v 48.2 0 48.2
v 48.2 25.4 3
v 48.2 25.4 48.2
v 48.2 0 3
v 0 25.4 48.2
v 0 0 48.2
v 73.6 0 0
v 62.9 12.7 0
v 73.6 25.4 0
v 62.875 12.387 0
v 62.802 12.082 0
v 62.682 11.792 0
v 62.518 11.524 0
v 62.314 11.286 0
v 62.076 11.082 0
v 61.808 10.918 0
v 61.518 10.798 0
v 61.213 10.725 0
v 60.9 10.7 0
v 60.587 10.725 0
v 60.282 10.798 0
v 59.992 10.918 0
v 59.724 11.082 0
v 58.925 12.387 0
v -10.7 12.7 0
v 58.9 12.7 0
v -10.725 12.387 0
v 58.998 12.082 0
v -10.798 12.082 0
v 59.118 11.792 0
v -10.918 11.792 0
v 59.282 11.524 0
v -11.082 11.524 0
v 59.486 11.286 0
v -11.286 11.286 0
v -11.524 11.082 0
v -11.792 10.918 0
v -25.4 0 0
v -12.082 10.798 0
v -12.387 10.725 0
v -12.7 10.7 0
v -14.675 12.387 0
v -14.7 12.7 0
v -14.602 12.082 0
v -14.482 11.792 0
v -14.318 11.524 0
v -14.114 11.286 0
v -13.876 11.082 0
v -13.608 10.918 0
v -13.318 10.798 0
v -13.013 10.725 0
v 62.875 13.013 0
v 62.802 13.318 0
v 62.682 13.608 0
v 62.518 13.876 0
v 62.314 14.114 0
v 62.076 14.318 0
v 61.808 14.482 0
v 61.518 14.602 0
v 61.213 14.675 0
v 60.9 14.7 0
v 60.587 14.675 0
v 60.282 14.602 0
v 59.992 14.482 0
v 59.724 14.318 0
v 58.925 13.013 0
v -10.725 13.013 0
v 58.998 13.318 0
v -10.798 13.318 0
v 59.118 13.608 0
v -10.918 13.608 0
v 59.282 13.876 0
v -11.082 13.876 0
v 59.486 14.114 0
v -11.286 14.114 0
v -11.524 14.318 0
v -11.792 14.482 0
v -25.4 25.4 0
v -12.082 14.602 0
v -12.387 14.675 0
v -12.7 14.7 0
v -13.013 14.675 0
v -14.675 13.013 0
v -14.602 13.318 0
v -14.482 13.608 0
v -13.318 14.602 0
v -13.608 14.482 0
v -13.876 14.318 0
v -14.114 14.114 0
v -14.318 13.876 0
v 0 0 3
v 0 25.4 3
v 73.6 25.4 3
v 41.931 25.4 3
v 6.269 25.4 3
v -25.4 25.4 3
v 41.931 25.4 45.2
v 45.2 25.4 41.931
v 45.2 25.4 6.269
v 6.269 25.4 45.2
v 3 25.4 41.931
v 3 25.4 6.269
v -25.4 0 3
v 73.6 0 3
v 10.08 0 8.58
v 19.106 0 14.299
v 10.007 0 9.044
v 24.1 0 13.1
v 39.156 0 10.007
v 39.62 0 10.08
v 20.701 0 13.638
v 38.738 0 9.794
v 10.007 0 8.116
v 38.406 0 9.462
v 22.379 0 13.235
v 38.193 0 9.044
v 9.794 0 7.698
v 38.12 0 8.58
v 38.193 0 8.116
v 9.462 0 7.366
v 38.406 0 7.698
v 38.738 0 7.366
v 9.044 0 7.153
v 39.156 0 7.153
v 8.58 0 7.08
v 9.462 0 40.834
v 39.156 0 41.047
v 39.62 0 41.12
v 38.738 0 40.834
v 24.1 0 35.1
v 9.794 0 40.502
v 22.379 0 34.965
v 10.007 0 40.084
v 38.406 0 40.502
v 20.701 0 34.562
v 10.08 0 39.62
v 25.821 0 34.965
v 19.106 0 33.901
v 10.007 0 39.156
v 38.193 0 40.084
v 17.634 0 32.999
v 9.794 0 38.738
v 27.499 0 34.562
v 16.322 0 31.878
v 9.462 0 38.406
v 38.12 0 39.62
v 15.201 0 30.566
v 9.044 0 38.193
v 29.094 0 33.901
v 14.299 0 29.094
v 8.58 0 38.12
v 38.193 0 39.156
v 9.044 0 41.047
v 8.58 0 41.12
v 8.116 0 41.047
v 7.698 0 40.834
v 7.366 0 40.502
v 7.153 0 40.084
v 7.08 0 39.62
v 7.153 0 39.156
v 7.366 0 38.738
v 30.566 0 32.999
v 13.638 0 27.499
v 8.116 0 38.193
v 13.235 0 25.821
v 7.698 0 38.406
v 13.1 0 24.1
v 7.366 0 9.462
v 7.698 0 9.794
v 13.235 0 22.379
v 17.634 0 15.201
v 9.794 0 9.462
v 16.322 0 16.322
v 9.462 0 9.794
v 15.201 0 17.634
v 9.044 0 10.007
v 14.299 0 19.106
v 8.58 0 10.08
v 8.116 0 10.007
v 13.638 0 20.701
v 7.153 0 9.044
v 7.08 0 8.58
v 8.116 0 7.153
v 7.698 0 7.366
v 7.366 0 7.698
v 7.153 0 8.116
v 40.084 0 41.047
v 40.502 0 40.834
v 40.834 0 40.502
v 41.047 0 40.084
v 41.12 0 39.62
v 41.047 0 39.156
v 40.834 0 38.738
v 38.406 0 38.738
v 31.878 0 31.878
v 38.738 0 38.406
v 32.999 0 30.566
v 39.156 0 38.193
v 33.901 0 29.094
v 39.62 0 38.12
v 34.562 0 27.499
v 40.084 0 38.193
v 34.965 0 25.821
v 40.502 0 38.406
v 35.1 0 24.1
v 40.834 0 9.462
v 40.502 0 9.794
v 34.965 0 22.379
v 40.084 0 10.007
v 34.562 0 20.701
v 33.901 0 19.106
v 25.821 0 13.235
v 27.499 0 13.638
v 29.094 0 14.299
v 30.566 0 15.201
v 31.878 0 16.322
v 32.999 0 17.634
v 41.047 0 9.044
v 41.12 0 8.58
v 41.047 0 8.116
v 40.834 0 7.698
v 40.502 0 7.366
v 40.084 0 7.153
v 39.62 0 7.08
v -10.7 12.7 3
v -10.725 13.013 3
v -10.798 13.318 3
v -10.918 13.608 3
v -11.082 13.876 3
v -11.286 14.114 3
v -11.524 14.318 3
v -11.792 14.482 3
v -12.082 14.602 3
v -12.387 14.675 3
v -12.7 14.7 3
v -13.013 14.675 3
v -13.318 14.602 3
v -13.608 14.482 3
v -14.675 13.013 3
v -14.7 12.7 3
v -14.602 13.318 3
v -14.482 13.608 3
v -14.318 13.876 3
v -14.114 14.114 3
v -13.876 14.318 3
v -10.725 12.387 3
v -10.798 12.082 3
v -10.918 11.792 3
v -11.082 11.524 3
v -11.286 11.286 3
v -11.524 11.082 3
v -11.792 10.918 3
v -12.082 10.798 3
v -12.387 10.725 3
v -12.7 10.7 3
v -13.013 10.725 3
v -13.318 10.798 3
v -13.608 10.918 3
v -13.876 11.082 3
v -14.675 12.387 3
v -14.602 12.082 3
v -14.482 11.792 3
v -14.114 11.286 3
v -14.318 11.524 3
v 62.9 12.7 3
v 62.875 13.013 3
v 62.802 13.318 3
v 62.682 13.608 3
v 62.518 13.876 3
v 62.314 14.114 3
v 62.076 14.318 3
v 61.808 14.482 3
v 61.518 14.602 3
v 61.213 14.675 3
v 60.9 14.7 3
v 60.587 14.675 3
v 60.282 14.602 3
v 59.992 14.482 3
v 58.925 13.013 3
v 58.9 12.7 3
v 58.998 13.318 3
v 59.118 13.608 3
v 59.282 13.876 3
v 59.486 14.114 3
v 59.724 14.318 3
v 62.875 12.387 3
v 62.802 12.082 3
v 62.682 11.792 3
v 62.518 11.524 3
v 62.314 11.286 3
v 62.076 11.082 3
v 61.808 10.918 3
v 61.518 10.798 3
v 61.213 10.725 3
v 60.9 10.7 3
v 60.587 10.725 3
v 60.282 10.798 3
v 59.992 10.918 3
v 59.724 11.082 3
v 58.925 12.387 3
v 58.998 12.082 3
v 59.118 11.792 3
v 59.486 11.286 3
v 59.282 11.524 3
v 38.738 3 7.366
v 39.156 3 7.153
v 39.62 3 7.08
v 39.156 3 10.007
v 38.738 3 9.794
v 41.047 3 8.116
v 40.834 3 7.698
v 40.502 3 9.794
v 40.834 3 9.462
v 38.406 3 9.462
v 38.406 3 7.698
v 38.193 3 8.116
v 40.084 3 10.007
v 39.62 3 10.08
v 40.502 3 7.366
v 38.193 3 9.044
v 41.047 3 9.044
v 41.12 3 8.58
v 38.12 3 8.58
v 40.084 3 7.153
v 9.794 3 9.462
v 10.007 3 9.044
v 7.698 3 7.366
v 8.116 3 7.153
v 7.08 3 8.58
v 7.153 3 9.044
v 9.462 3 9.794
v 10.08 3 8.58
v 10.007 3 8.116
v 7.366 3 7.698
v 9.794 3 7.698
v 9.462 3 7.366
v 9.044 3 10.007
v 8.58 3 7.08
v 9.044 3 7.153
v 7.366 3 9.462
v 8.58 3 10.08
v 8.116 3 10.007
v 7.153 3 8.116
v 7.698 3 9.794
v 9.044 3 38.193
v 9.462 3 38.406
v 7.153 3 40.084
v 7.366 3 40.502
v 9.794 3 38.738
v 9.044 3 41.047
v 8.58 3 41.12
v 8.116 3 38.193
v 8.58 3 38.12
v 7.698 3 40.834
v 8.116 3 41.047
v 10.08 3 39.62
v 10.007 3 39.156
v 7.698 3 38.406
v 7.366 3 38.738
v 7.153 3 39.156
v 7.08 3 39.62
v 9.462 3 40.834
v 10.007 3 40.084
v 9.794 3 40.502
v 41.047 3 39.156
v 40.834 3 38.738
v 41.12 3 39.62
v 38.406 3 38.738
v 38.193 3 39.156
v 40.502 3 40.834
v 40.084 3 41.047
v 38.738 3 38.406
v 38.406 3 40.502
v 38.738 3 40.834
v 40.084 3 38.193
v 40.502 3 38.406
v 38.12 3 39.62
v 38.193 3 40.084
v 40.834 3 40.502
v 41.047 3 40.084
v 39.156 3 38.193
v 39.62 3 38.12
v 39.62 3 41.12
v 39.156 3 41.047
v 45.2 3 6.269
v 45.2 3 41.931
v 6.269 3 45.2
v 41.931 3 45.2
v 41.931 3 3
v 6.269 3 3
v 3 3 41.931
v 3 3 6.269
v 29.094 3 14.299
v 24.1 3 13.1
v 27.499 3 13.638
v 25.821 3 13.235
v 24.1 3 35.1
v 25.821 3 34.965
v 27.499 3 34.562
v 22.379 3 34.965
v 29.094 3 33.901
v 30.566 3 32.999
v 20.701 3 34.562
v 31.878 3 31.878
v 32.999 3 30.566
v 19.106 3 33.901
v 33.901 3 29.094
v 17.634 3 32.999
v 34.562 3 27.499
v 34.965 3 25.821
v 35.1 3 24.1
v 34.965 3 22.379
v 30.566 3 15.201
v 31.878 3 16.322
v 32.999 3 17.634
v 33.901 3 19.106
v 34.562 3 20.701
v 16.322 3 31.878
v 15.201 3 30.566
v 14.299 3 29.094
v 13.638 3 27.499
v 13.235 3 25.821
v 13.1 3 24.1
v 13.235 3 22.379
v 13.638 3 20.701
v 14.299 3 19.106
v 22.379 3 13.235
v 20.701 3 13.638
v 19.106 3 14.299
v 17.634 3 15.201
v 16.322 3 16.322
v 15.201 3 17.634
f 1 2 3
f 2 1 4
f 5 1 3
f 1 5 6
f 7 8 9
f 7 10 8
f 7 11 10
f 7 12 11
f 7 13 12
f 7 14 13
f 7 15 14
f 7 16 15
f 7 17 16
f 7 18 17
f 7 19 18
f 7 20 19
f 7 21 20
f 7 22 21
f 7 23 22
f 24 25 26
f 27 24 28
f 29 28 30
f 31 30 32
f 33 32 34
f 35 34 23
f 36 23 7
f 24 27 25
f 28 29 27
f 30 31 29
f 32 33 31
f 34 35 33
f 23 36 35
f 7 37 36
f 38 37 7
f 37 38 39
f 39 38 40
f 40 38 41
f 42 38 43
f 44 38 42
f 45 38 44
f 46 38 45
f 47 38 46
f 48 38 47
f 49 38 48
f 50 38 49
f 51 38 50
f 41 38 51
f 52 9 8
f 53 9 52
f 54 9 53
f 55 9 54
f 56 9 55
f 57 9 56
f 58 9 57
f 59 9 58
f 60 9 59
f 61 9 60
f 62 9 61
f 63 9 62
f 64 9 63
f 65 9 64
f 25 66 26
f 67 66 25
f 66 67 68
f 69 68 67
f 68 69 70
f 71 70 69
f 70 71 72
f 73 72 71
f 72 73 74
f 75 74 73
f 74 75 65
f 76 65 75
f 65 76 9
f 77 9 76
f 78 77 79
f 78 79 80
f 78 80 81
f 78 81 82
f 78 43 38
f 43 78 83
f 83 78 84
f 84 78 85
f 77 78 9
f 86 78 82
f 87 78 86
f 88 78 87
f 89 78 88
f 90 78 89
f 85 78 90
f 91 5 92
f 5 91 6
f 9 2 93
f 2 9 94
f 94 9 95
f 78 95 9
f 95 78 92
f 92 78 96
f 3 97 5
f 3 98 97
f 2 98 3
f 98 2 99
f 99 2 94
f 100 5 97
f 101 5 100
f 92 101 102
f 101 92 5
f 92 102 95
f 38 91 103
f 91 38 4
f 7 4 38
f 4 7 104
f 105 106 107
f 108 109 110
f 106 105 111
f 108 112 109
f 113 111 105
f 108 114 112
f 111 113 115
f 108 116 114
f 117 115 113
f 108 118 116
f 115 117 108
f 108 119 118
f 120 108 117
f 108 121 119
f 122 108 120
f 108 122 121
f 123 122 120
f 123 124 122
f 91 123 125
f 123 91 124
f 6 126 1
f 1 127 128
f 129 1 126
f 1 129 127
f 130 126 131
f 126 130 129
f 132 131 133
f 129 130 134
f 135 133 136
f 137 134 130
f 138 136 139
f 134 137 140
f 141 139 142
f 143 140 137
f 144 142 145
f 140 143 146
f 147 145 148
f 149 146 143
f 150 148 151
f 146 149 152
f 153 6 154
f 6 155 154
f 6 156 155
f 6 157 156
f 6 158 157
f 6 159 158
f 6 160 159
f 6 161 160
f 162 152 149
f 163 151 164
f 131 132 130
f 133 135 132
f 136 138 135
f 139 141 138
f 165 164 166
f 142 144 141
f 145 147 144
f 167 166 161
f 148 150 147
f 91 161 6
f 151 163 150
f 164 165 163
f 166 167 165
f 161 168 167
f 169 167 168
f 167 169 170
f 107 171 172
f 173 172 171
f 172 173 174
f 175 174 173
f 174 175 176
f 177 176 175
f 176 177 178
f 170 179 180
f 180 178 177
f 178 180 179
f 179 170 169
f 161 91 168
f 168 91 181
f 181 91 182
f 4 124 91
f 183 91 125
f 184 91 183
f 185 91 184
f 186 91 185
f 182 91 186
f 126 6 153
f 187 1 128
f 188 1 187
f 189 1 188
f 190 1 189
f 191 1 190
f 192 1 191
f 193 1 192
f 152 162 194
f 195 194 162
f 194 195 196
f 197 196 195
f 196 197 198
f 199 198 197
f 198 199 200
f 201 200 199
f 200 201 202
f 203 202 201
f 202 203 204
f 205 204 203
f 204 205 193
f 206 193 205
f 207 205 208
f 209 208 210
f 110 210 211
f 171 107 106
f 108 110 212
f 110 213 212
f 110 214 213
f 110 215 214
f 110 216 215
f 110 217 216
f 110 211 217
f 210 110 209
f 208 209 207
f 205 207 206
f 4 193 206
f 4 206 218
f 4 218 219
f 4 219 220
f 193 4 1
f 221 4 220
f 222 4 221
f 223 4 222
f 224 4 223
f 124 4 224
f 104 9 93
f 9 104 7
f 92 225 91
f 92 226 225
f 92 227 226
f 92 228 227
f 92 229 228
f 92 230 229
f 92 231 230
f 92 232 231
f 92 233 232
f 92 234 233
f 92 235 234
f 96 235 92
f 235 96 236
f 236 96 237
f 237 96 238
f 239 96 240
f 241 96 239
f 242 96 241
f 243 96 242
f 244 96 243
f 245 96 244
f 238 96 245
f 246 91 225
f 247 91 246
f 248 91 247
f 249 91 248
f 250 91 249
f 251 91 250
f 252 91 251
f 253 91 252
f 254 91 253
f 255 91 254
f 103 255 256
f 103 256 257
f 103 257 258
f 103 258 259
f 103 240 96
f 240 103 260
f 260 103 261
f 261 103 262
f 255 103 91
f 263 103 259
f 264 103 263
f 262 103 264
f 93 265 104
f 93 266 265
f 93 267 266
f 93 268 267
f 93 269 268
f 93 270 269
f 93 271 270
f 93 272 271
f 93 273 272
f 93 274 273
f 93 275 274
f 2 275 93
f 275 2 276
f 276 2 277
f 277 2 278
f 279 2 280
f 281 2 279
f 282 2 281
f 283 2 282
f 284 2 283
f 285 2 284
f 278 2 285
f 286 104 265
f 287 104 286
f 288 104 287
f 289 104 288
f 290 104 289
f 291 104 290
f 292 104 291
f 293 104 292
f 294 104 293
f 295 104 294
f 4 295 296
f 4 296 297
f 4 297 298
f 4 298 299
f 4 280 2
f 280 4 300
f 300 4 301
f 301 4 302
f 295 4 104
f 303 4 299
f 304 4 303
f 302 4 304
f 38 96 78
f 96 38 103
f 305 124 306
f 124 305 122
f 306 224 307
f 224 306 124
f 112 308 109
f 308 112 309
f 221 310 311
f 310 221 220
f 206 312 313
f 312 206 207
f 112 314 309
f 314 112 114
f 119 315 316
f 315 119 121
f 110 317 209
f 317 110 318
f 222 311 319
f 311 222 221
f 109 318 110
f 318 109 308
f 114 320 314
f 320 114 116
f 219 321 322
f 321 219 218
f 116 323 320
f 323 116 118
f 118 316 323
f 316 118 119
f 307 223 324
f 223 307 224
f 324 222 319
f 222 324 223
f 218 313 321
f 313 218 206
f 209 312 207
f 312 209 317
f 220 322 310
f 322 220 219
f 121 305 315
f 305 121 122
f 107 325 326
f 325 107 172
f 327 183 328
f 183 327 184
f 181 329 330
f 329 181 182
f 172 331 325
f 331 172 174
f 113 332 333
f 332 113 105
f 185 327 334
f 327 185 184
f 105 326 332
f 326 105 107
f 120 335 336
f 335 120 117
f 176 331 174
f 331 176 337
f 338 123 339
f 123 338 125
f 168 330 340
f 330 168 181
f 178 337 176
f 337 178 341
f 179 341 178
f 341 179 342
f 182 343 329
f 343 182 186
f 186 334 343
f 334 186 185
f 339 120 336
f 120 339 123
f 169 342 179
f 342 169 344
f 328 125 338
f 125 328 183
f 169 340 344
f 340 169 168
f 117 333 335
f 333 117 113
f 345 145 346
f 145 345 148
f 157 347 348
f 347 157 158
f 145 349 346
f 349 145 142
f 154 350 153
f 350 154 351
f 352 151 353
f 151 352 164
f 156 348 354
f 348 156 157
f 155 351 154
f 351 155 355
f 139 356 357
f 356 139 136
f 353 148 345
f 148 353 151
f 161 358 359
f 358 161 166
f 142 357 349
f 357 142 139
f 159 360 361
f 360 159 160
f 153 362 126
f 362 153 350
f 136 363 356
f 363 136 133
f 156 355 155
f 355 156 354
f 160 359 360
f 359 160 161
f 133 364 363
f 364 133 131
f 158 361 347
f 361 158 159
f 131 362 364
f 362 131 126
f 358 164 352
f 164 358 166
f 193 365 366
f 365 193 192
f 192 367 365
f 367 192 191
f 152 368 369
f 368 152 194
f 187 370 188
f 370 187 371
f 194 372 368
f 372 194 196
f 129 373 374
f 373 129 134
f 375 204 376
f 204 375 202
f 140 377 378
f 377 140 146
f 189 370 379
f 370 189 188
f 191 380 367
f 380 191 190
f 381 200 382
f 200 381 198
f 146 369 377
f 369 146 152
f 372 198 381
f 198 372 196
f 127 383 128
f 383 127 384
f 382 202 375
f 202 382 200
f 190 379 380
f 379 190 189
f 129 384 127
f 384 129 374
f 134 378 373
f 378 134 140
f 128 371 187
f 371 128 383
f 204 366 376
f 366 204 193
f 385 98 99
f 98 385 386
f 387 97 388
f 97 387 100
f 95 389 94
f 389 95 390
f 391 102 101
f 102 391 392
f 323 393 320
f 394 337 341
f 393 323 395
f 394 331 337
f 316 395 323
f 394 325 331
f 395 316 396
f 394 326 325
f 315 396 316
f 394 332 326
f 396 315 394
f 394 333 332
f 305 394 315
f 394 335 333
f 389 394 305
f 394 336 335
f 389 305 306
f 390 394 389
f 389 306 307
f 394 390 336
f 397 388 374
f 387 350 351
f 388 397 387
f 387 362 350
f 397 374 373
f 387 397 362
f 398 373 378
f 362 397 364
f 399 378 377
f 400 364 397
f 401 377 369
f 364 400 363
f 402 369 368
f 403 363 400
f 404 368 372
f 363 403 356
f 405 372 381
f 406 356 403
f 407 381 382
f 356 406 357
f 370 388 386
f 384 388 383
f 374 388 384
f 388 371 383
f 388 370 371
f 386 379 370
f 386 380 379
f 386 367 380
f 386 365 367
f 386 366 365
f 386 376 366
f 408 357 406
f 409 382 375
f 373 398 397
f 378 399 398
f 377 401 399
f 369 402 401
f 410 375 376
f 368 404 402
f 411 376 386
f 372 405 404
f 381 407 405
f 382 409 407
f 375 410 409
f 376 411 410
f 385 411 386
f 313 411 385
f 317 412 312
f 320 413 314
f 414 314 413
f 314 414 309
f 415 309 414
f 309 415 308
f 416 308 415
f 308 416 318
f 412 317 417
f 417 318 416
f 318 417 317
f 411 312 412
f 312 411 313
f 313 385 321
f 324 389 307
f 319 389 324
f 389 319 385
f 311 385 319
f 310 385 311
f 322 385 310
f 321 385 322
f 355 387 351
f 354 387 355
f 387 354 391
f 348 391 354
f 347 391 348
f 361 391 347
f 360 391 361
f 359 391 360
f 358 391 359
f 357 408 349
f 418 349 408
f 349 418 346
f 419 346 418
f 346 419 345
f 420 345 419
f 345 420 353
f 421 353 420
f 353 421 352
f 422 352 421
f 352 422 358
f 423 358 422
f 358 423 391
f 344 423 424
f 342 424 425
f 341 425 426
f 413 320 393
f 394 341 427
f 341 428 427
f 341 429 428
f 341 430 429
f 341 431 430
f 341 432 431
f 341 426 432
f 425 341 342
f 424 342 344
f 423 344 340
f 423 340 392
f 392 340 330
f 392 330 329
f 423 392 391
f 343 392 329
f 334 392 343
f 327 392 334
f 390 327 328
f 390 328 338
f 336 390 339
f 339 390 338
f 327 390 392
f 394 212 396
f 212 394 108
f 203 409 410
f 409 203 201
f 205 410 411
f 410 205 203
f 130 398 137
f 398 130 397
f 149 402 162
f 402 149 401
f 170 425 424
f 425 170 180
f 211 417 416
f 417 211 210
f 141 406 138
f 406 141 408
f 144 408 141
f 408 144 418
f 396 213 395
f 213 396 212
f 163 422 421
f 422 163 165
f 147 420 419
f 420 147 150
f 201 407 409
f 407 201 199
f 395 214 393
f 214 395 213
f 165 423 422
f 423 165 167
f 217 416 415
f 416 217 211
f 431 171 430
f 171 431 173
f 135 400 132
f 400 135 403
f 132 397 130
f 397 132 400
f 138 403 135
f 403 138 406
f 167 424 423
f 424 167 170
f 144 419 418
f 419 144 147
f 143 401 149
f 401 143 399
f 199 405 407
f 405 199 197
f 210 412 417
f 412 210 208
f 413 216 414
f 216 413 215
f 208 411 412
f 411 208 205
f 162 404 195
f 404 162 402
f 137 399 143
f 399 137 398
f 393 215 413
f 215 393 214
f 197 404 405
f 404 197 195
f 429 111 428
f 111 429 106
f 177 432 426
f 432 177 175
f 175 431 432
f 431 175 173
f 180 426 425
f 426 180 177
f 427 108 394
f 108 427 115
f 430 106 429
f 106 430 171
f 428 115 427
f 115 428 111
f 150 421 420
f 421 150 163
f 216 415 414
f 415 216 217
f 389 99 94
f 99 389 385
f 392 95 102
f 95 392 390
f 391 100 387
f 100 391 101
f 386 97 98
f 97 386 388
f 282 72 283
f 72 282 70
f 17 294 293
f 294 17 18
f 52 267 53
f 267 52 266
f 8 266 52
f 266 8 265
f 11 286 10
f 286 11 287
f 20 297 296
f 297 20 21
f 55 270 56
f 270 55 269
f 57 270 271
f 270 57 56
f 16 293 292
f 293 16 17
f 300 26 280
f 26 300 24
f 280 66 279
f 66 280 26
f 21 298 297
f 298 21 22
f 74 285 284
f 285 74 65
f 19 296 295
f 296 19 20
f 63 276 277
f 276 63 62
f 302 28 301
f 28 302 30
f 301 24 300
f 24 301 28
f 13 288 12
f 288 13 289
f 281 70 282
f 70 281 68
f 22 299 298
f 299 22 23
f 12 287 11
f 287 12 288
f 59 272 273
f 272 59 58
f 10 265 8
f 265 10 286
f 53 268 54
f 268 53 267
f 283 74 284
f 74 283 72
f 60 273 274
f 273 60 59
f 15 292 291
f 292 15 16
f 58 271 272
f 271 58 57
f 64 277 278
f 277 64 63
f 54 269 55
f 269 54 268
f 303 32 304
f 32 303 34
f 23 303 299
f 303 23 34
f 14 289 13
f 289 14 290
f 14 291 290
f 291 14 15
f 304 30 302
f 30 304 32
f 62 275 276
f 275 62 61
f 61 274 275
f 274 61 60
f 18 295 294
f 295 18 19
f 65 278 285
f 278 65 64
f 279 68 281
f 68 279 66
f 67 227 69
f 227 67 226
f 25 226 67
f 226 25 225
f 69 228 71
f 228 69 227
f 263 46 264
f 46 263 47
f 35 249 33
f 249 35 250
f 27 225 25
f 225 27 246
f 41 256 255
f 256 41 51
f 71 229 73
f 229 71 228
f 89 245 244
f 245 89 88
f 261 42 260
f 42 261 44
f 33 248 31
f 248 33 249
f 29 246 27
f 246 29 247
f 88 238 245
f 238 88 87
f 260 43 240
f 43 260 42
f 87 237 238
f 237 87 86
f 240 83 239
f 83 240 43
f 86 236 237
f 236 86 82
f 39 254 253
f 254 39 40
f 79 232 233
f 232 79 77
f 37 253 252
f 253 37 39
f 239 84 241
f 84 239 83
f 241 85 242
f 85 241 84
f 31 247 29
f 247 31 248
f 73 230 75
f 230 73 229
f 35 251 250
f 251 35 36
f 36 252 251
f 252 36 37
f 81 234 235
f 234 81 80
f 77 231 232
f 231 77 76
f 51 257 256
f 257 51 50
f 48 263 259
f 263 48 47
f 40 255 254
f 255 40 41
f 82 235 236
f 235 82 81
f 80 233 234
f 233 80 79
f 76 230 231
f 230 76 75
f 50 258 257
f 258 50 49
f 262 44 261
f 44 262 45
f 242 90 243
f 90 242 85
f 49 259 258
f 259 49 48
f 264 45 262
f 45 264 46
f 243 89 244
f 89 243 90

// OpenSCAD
// preview[view:north west, tilt:top diagonal]

bracket_wall_width = 3;
bracket_depth = 25.4; // 1 inch
//lengths of tabs
bracket_flaps =  25.4;
bracket_bolts_diameter = 4; 
bevel_inner_corners = "yes"; //[yes,no]


module NemaForCSG(nema_side, nema_depth, nema_bolts, nema_crown, nema_bolt_radious)
{
	//bevel corners
	r1 = nema_side/2- nema_bolts/2;
	r2 = sqrt(2)* r1 ;
	r=(r2-r1)*2;
	
	
	difference()
	{
	
		union()
		{
			cube([nema_side,nema_depth,nema_side]);
	
			translate( [nema_side/2,0,nema_side/2]) 
				rotate(90,[1,0,0]) 
				{
					cylinder(r = nema_crown, h = 30, $fn = 40,center=true);
				}

			translate( [nema_side/2,0,nema_side/2])
			{
				//bolt holes
				for(j=[1:4])
				{		
					rotate(90*j,[0,1,0]) 
						translate( [nema_bolts/2.0,0,nema_bolts/2.0]) 
							rotate(-90,[1,0,0]) 
							{
								cylinder(r = nema_bolt_radious, h = 30, $fn = 20,center=true);
							}
				}
			}
		}	

		if (bevel_inner_corners == "yes")
		{
			//bevel
			translate( [nema_side/2,0,nema_side/2])
			{
			
				for(j=[1:4])
				{
					rotate(90*j,[0,1,0]) 
						translate( [nema_side/2,nema_depth/2,nema_side/2]) 
					rotate(45,[0,1,0]) 
					cube([30,50,r], center = true);
				}
			}
		}
	}

}

//units are in millimeters
M3 = 3.0/2.0;
nema17_side = 42.2;
nema17_bolts = 31.04;
nema17_depth = 33.8;
nema17_crown = 11;
nema17_bolt_radious = M3;

difference()
{
	union()
	{
		cube([nema17_side+bracket_wall_width*2, bracket_depth, nema17_side+bracket_wall_width*2]);

		translate([-bracket_flaps,0,0])
			cube([nema17_side+(bracket_wall_width+bracket_flaps)*2,bracket_depth,bracket_wall_width]);		
	}

	translate([bracket_wall_width + nema17_side + bracket_wall_width + bracket_flaps/2,bracket_depth/2,0])
		cylinder(r = bracket_bolts_diameter/2, h = 30, $fn = 40,center=true);

	translate([-bracket_flaps/2,bracket_depth/2,0])
		cylinder(r = bracket_bolts_diameter/2, h = 30, $fn = 40,center=true);


	translate([bracket_wall_width,bracket_wall_width,bracket_wall_width])
	NemaForCSG(nema17_side, nema17_depth, nema17_bolts, nema17_crown, nema17_bolt_radious);

}
